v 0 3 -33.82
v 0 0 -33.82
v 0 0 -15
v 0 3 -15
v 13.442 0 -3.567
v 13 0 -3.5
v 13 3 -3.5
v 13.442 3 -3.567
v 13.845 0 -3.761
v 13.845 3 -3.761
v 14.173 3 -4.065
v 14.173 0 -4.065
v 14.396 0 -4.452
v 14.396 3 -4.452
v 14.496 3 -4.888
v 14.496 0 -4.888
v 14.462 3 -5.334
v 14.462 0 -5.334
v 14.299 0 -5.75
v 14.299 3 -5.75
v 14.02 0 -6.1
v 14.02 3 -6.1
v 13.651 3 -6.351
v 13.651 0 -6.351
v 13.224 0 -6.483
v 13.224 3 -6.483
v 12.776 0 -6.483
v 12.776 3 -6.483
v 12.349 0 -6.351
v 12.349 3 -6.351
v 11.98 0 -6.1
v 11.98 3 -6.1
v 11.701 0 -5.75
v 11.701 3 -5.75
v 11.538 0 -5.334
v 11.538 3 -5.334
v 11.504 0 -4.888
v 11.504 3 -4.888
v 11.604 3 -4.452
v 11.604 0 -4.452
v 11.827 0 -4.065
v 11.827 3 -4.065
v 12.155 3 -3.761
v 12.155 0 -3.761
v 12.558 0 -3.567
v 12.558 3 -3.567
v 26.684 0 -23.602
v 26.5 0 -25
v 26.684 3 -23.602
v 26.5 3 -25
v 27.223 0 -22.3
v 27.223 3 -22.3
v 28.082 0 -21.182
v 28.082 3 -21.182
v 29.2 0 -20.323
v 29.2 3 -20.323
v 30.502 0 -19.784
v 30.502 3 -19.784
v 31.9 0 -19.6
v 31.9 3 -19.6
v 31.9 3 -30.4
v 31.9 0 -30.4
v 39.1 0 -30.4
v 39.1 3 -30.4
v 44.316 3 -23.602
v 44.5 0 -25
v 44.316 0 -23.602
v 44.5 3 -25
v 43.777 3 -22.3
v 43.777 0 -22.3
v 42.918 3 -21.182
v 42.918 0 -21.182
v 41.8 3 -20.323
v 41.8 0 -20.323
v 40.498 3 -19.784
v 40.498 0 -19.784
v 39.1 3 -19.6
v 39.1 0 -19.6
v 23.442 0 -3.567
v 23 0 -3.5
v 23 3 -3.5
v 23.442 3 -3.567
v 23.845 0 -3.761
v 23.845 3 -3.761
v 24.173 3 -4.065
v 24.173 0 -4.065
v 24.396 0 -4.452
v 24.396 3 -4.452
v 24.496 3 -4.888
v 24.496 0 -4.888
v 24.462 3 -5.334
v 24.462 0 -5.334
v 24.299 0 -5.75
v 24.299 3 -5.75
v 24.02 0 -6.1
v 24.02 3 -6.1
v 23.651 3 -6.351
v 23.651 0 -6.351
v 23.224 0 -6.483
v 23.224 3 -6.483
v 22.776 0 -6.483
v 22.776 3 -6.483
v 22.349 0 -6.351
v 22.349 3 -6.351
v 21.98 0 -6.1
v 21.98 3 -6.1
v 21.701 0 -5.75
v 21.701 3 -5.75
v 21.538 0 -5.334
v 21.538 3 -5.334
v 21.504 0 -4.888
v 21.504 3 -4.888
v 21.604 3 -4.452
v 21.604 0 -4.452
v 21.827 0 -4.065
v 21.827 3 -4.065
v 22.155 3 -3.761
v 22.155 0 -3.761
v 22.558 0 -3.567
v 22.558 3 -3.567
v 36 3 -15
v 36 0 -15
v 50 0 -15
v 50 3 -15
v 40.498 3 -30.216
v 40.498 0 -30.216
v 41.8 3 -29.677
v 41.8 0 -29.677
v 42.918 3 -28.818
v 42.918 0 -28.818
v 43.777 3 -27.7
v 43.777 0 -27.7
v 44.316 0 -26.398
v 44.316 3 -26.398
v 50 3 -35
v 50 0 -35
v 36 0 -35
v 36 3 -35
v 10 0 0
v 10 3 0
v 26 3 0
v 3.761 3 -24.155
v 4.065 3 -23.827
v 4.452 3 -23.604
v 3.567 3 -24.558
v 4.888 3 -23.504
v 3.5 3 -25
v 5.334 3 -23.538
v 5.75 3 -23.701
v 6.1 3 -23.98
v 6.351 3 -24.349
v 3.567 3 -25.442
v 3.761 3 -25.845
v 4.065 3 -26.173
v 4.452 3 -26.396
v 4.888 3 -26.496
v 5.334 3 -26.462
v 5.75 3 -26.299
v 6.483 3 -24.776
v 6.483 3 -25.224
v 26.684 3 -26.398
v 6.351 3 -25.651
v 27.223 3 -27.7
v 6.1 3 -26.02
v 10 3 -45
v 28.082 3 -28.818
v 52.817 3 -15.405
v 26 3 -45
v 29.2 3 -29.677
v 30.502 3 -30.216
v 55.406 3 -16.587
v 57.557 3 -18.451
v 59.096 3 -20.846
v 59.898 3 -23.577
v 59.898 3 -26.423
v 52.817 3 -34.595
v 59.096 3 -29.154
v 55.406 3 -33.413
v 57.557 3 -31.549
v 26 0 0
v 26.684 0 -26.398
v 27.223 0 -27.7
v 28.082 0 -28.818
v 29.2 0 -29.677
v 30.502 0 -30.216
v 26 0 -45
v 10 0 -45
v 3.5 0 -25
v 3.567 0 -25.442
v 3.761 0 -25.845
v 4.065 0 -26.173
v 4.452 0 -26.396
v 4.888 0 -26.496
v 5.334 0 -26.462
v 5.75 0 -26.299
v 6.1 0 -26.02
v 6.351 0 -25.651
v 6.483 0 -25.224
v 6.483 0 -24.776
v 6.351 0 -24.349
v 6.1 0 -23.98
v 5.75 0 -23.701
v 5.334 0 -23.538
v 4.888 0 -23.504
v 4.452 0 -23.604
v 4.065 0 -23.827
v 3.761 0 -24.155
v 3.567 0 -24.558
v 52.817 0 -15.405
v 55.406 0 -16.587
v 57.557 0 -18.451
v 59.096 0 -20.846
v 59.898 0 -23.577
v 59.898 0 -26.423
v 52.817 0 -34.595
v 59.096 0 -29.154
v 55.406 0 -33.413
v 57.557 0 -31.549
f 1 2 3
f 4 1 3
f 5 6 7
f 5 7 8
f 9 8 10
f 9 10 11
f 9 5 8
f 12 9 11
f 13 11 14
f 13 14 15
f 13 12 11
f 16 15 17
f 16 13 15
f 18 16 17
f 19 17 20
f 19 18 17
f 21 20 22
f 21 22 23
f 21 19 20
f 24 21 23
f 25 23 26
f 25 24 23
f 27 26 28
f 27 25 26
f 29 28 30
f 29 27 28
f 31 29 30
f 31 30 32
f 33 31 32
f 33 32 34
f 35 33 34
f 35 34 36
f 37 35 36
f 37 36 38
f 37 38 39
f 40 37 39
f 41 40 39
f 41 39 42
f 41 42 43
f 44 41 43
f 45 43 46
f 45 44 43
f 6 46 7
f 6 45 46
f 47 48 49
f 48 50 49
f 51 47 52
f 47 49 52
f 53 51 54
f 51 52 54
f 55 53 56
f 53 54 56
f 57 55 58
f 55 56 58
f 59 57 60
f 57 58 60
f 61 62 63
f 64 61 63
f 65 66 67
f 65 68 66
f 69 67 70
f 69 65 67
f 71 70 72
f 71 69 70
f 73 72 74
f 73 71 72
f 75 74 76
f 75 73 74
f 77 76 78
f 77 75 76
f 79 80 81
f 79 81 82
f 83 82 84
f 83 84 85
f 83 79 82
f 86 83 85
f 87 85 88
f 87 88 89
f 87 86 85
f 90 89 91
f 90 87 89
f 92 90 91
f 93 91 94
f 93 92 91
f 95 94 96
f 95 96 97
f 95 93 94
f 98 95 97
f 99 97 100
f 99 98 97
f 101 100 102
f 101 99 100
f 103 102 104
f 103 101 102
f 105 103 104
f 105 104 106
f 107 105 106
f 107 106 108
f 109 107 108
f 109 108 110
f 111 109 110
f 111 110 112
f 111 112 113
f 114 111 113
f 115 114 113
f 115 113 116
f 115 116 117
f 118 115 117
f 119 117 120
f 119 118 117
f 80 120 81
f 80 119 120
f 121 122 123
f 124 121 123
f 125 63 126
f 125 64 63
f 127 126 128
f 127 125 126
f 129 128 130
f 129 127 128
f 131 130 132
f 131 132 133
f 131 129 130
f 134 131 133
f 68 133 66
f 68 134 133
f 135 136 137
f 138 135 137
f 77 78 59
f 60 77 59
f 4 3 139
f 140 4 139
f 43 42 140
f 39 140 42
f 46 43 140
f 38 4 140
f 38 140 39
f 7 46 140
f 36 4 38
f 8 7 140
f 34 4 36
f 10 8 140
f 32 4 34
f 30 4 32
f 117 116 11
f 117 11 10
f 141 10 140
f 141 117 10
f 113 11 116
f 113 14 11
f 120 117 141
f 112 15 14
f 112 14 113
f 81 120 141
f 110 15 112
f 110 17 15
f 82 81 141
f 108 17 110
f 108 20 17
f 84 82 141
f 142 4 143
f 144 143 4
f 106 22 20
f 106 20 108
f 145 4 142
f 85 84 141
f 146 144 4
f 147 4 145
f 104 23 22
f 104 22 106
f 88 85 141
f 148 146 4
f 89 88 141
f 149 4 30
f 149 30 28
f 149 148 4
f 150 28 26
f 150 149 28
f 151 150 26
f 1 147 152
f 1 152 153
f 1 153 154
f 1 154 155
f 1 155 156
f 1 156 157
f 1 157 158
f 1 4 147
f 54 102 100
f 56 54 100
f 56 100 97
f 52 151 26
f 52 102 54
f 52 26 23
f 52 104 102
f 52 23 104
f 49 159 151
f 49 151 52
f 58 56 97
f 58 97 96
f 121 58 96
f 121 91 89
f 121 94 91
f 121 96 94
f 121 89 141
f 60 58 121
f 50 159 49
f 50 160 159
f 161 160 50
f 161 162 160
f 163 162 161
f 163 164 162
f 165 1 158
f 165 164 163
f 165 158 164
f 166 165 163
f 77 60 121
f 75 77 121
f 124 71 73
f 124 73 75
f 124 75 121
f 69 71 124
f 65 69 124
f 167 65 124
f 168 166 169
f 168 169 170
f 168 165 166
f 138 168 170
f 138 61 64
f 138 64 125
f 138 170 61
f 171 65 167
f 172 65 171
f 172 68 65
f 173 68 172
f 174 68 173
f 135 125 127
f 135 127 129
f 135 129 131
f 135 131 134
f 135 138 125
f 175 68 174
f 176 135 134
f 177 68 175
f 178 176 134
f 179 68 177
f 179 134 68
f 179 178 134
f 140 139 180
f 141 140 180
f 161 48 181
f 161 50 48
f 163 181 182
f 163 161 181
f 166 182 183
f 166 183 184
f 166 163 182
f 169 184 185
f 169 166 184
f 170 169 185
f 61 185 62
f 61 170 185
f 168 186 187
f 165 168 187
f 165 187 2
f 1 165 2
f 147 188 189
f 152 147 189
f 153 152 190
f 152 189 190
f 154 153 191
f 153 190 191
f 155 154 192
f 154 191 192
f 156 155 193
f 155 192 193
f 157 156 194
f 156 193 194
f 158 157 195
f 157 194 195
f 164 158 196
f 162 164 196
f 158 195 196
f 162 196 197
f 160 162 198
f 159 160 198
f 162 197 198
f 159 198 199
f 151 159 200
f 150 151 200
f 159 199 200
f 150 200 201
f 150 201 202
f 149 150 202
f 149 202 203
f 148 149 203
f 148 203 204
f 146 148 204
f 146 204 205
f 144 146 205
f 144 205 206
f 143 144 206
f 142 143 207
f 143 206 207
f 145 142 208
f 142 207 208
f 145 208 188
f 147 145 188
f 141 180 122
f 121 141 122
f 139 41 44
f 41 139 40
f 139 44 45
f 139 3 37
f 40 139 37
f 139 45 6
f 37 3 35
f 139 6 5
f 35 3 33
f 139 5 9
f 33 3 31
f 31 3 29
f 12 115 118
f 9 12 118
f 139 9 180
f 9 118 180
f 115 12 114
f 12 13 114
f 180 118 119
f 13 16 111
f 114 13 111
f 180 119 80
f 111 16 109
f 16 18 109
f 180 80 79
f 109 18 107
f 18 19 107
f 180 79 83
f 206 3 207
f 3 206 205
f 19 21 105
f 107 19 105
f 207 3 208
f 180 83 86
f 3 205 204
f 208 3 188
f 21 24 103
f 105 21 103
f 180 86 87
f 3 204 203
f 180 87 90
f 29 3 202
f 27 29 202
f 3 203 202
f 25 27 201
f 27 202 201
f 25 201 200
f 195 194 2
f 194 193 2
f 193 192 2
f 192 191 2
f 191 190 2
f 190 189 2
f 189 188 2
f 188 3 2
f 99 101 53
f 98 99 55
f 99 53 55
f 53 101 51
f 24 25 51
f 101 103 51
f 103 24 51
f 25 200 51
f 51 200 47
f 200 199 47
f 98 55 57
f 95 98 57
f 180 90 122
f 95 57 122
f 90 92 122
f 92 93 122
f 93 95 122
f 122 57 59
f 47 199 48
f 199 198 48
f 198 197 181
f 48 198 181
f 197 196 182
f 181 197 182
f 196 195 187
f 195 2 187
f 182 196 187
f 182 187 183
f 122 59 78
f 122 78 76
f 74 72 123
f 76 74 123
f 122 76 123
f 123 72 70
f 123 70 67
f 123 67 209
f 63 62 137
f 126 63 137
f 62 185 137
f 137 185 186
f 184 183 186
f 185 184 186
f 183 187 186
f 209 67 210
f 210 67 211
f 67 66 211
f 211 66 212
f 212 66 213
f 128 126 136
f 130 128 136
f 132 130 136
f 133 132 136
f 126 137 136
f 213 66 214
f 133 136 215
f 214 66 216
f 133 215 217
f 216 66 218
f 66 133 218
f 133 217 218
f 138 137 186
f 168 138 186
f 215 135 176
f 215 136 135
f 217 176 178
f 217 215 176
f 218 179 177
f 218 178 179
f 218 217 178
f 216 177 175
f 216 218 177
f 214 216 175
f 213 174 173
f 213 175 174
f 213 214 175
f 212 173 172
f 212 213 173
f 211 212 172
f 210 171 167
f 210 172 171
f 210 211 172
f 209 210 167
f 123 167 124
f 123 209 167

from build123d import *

# Parameters (mm, degrees)
SKETCH1_R           = 1.5
BOSS_EXTRUDE1_DEPTH = 3
FILLET5_RADIUS      = 10
FILLET5_LENGTH      = 3
FILLET2_R           = 5.4
FILLET4_R           = 5.4


with BuildPart() as part:
    # Sketch1 → Boss-Extrude1 (new body)
    # profile 1 of 2: a face of its own
    with BuildSketch(Plane(origin=(0, 0, 0), x_dir=(1, 0, 0), z_dir=(0, 1, 0))):
        with BuildLine():
            Line((3.5, 25), (0, 25))
            Line((0, 25), (0, 15))
            Line((0, 15), (10, 0))
            Line((10, 0), (26, 0))
            Line((26, 0), (36, 15))
            Line((36, 15), (60, 15))
            Line((60, 15), (60, 25))
            Line((60, 25), (44.5, 25))
            Line((44.5, 25), (44.5, 19.6))
            Line((44.5, 19.6), (26.5, 19.6))
            Line((26.5, 19.6), (26.5, 25))
            Line((26.5, 25), (6.5, 25))
            ThreePointArc((6.5, 25), (5, 23.5), (3.5, 25))
        make_face()
        with Locations(Location((13, 5, 0), (0, 0, 270))):
            Circle(SKETCH1_R, mode=Mode.SUBTRACT)
        with Locations(Location((23, 5, 0), (0, 0, 270))):
            Circle(SKETCH1_R, mode=Mode.SUBTRACT)
    # profile 2 of 2: a face of its own
    with BuildSketch(Plane(origin=(0, 0, 0), x_dir=(1, 0, 0), z_dir=(0, 1, 0))):
        with BuildLine():
            Line((10, 45), (0, 33.819660113))
            Line((0, 33.819660113), (0, 25))
            Line((0, 25), (3.5, 25))
            ThreePointArc((3.5, 25), (5, 26.5), (6.5, 25))
            Line((6.5, 25), (26.5, 25))
            Line((26.5, 25), (26.5, 30.4))
            Line((26.5, 30.4), (44.5, 30.4))
            Line((44.5, 30.4), (44.5, 25))
            Line((44.5, 25), (60, 25))
            Line((60, 25), (60, 35))
            Line((60, 35), (36, 35))
            Line((36, 35), (26, 45))
            Line((26, 45), (10, 45))
        make_face()
    extrude(amount=BOSS_EXTRUDE1_DEPTH)

    # Fillet5: full round fillet: the end face becomes a half cylinder, R = half its width
    fillet5_face = Plane((60, 1.5, -25), x_dir=(0, -1, 0), z_dir=(1, 0, 0))  # on the end face: x along it, z out of the body
    fillet5_slab = fillet5_face.offset(-FILLET5_RADIUS / 2) * Box(FILLET5_LENGTH, 2 * FILLET5_RADIUS, FILLET5_RADIUS, mode=Mode.PRIVATE)  # the body's end, R deep
    fillet5_round = Plane((50, 1.5, -25), x_dir=(1, 0, 0), z_dir=(0, -1, 0)) * Cylinder(FILLET5_RADIUS, FILLET5_LENGTH, mode=Mode.PRIVATE)  # its axis R under the face
    add(fillet5_slab - fillet5_round, mode=Mode.SUBTRACT)

    # Fillet2
    fillet2_edges = [part.edges().sort_by_distance(p)[0] for p in [
        (26.5, 1.5, -30.4),
        (26.5, 1.5, -19.6),
    ]]
    fillet(fillet2_edges, radius=FILLET2_R - 0.0001)  # a hair under: the kernel refuses the full size

    # Fillet4
    fillet4_edges = [part.edges().sort_by_distance(p)[0] for p in [
        (44.5, 1.5, -19.6),
        (44.5, 1.5, -30.4),
    ]]
    fillet(fillet4_edges, radius=FILLET4_R - 0.0001)  # a hair under: the kernel refuses the full size


solid = part.part
